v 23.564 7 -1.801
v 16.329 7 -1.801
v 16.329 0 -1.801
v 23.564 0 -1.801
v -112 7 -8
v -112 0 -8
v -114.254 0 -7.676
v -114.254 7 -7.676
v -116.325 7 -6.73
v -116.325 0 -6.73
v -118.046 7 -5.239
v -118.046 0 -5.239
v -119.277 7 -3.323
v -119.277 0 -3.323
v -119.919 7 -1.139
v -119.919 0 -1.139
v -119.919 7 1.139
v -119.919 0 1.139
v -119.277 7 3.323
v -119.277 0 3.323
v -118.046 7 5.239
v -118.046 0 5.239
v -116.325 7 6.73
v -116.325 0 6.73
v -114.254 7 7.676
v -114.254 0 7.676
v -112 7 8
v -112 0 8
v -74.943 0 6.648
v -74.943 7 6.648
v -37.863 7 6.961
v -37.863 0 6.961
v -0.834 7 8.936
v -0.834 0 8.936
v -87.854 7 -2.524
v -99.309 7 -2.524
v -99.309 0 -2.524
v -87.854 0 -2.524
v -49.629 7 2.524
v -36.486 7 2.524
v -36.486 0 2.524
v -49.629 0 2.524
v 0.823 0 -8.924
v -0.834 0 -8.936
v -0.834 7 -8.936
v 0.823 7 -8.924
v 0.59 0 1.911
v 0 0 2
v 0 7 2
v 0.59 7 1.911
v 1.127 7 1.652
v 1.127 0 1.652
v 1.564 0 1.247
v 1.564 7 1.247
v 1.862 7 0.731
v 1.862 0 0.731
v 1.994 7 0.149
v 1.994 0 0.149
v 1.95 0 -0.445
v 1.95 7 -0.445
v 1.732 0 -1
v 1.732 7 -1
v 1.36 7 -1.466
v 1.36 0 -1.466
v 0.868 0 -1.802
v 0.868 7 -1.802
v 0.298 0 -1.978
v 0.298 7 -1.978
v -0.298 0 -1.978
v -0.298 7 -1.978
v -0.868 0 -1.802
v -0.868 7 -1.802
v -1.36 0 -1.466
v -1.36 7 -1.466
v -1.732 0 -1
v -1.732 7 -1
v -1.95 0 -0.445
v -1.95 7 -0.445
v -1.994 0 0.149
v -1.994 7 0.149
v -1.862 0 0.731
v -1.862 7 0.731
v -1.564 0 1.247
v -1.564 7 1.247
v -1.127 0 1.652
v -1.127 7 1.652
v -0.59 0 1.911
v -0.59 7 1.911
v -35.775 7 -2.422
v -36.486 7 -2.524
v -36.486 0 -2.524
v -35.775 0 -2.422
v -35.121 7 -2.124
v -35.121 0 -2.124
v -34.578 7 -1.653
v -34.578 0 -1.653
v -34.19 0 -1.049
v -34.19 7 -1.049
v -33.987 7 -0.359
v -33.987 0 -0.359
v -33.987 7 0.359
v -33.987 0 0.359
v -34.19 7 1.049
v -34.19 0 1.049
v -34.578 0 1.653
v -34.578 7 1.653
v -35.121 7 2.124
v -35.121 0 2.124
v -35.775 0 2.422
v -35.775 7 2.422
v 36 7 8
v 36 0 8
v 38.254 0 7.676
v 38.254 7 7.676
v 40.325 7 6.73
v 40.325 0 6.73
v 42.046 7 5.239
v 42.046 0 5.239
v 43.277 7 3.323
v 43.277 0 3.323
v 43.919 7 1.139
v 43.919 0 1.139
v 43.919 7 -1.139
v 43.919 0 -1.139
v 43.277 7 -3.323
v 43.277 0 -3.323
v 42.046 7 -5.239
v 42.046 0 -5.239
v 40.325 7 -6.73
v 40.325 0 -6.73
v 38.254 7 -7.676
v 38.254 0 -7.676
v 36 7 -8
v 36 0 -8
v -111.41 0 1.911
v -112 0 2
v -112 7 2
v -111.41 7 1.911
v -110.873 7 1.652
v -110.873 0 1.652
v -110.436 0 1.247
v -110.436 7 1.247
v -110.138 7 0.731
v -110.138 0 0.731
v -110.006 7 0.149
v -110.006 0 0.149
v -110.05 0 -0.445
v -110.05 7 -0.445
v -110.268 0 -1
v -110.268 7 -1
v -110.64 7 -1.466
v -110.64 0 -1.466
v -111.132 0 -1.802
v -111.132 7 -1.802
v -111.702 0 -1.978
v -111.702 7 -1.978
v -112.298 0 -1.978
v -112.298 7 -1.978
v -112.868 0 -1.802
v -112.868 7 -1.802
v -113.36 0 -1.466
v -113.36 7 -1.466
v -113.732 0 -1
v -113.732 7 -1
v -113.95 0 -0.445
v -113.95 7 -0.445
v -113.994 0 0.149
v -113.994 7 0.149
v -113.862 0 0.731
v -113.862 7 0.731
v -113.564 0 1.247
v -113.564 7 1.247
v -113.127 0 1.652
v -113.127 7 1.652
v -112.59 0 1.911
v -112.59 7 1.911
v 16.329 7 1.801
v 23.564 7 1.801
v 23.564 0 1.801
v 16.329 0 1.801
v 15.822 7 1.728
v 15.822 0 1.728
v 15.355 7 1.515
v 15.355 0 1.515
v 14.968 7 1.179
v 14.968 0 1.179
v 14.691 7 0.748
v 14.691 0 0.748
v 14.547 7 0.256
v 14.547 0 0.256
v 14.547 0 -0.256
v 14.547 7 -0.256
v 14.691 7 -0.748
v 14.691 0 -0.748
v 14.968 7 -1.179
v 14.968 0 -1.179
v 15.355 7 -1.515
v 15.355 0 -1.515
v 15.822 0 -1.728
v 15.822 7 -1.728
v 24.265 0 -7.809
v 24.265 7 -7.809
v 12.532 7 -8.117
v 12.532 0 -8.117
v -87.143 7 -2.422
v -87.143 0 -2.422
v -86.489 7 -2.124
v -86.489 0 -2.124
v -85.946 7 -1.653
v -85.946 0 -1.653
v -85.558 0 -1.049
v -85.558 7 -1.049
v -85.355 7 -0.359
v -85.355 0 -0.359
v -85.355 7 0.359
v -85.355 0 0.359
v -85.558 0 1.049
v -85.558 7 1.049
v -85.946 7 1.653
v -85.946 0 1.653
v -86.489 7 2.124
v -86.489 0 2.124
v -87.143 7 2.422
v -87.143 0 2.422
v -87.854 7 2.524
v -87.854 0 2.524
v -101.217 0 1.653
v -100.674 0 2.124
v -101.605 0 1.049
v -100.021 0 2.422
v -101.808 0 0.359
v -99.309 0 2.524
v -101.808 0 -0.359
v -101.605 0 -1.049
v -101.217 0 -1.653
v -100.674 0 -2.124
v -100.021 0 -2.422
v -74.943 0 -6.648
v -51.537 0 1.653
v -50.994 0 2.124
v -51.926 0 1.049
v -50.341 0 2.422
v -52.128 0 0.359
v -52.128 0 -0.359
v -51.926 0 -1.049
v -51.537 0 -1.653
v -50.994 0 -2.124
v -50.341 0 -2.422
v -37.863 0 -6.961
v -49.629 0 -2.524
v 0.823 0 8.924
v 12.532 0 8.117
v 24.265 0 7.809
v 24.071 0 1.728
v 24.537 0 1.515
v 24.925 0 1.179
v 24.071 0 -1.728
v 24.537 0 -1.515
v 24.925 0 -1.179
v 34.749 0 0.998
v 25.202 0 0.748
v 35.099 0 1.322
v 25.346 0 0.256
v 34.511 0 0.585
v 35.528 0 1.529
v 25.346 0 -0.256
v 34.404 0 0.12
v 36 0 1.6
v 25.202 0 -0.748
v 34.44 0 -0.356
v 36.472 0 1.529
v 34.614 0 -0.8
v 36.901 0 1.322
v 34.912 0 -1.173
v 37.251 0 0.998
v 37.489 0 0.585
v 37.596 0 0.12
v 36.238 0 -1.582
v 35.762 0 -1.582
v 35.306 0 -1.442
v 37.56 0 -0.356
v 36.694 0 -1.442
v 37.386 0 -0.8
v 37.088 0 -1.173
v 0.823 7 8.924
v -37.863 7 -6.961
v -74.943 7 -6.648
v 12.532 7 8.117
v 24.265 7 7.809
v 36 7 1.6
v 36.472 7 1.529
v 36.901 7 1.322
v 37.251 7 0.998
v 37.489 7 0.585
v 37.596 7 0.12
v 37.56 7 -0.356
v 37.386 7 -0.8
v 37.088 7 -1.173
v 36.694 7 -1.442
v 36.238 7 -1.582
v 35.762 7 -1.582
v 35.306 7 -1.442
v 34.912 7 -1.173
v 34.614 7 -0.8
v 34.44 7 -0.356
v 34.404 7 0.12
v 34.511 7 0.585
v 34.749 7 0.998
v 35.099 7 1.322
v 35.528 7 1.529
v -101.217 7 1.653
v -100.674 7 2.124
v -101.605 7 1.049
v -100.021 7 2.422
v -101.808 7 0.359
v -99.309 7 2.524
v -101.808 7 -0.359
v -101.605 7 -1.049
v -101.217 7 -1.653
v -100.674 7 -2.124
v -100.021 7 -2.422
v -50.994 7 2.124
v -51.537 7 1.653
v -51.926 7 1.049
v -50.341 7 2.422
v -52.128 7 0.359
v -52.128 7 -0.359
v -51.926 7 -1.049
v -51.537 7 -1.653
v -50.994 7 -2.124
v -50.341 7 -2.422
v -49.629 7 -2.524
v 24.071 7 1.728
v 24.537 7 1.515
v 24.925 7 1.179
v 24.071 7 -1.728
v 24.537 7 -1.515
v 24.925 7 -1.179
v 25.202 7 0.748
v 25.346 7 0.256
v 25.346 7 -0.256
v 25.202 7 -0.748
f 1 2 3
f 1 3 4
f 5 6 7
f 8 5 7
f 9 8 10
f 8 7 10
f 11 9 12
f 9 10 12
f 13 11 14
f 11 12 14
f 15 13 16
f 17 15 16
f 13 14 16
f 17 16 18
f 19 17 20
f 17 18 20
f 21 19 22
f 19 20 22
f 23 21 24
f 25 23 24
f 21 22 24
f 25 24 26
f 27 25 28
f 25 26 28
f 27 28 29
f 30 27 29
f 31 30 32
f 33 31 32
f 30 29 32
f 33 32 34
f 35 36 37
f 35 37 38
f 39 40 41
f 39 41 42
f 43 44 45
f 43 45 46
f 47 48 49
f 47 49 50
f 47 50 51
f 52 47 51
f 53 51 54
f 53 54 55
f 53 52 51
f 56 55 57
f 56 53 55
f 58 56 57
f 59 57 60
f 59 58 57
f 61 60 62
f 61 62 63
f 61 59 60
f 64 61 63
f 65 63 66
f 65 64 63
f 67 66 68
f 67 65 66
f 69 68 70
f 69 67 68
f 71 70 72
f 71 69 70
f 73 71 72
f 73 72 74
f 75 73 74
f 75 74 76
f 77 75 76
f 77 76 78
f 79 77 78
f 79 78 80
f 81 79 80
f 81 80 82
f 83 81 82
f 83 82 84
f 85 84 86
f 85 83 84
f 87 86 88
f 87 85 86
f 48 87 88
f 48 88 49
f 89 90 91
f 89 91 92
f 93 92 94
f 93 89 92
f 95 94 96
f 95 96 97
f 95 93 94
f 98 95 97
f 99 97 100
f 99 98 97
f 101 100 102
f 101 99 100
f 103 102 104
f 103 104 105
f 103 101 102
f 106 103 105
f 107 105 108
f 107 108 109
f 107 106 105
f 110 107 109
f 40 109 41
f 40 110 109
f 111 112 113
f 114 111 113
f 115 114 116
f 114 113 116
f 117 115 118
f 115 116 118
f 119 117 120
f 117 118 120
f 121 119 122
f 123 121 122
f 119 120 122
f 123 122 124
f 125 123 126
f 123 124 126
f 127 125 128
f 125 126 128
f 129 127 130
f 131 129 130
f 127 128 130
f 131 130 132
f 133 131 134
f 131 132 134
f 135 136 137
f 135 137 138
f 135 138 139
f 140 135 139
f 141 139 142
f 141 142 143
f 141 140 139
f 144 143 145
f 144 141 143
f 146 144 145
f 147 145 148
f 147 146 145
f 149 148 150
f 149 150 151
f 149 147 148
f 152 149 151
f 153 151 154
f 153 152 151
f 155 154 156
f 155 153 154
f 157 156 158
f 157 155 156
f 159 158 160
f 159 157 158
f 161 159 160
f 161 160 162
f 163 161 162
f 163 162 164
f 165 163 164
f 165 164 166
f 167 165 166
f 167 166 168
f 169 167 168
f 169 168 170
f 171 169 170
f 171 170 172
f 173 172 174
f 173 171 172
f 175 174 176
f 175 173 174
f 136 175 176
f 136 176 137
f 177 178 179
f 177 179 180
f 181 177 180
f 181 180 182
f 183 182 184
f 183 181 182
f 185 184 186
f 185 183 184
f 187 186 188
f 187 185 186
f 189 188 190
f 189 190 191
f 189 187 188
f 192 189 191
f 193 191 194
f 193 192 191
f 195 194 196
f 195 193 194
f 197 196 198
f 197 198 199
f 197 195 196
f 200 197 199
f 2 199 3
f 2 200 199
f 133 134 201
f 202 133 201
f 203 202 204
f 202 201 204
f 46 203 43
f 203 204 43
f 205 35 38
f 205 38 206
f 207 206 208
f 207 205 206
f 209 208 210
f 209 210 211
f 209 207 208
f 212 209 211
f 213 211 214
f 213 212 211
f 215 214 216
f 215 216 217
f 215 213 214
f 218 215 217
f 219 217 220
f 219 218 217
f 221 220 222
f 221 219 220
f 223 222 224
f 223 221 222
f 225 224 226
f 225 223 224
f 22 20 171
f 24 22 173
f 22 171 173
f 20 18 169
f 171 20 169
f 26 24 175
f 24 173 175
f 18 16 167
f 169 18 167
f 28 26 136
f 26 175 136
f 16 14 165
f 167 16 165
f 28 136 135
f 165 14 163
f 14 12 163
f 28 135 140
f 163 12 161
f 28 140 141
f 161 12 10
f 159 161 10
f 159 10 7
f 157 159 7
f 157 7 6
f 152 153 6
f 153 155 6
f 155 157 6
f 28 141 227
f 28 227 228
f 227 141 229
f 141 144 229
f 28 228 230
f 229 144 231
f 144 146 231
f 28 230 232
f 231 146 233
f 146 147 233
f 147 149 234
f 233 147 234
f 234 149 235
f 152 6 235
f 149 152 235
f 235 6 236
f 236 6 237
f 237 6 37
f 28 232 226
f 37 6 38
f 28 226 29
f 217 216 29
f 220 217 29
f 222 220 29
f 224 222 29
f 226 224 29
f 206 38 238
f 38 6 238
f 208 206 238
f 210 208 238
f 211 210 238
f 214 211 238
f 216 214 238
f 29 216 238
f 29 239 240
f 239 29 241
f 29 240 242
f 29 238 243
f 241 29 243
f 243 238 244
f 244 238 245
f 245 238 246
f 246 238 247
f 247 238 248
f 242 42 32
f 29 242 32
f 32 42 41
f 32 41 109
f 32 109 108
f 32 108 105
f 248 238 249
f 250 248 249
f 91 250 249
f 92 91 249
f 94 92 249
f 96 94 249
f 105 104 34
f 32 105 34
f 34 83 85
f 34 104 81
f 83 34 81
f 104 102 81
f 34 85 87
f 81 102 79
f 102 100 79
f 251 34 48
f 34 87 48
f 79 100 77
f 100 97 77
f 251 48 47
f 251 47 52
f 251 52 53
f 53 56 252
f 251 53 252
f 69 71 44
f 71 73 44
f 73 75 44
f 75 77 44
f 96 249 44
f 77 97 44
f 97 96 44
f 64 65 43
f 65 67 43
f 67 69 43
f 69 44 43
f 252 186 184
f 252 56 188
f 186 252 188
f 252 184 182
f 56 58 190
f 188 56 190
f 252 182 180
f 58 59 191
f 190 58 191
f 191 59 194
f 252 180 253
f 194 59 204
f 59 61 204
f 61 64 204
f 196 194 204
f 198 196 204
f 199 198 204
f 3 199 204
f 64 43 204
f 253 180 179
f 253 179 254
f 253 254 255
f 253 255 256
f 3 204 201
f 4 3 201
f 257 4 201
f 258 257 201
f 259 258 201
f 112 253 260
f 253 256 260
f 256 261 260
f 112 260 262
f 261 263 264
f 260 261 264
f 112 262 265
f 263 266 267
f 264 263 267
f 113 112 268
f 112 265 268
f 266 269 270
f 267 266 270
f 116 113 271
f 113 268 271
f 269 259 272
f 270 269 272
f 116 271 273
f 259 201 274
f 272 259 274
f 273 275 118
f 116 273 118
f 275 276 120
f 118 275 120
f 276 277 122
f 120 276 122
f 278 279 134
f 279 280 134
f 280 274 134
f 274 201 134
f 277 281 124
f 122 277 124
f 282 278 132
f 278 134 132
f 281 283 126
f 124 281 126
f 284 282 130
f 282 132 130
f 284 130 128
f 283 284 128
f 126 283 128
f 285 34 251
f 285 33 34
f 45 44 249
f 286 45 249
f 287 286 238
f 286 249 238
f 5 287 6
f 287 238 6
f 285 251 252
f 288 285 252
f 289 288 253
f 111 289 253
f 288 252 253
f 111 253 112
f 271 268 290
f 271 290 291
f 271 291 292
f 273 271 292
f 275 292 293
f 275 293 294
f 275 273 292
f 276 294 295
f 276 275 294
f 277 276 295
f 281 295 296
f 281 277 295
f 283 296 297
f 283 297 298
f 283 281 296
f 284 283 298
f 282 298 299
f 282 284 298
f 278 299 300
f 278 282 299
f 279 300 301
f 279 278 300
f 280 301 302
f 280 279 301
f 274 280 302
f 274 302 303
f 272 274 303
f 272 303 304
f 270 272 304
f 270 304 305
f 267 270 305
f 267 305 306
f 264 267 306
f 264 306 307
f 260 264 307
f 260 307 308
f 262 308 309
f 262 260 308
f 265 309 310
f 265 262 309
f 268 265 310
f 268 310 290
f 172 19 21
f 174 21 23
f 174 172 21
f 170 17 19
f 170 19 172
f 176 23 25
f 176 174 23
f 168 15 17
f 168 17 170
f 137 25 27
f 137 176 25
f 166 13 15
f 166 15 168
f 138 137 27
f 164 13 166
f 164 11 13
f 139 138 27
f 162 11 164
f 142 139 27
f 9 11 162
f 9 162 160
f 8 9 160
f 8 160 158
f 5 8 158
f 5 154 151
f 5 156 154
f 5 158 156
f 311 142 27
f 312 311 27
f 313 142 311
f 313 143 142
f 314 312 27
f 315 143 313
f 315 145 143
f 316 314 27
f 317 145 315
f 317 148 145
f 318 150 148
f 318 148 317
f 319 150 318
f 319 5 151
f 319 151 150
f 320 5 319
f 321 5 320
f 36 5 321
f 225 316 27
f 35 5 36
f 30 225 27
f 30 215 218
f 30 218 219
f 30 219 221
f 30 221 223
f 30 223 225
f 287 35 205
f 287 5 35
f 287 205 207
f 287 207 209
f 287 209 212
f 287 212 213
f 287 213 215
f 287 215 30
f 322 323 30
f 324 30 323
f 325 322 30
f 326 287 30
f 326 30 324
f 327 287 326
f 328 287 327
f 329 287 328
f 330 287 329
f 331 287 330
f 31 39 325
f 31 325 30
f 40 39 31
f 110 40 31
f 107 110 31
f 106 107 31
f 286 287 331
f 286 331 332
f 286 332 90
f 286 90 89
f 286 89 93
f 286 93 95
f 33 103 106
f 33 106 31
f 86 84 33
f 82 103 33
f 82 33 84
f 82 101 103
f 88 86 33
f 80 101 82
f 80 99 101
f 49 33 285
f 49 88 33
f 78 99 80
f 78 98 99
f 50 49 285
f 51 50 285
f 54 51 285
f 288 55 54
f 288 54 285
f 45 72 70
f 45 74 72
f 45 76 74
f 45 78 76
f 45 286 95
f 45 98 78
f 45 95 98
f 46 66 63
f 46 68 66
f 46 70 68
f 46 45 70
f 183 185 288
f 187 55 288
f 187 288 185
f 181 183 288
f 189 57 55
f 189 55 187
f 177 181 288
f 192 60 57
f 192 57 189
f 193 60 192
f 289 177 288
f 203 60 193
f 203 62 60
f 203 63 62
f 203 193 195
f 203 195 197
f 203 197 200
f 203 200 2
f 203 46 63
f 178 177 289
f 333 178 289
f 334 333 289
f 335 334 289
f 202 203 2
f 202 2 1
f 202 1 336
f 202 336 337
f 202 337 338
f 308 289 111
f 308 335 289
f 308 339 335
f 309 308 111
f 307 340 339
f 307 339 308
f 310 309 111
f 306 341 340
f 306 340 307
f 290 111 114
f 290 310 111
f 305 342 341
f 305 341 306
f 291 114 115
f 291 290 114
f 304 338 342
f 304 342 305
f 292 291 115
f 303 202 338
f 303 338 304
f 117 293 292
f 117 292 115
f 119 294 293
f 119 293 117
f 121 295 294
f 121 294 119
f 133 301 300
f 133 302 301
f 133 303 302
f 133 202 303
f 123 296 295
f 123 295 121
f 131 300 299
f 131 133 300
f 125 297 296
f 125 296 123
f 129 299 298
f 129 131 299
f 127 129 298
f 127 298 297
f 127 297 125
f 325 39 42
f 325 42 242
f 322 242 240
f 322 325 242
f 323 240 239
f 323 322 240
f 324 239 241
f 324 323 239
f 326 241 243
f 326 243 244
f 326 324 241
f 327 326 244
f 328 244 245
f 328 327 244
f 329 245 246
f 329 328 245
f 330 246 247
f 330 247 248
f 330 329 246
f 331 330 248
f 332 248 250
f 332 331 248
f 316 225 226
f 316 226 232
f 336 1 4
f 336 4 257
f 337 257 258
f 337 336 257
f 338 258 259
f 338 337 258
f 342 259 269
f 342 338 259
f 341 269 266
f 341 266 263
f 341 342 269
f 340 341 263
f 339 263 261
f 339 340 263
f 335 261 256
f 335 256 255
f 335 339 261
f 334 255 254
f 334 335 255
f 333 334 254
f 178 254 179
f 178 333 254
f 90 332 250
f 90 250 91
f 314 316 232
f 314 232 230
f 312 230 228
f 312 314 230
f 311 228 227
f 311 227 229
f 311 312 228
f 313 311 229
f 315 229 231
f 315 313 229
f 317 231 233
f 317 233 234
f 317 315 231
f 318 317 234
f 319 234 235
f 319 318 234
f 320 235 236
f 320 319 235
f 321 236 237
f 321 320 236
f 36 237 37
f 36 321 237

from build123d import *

# Parameters (mm, degrees)
SKETCH1_R           = 2
SKETCH1_R_2         = 1.6
BOSS_EXTRUDE1_DEPTH = 7
FILLET1_R           = 10
CUT_EXTRUDE1_DEPTH  = 7


with BuildPart() as part:
    # Sketch1 → Boss-Extrude1 (new body)
    with BuildSketch(Plane(origin=(0, 0, 0), x_dir=(1, 0, 0), z_dir=(0, 1, 0))):
        with BuildLine():
            ThreePointArc((-112, -8), (-55.983036626, -6.600102157), (0, -9))
            ThreePointArc((0, -9), (17.983664082, -7.911906937), (36, -8))
            ThreePointArc((36, -8), (44, 0), (36, 8))
            ThreePointArc((36, 8), (17.983664082, 7.911906937), (0, 9))
            ThreePointArc((0, 9), (-55.983036626, 6.600102157), (-112, 8))
            ThreePointArc((-112, 8), (-120, 0), (-112, -8))
        make_face()
        with Locations(Location((-112, 0, 0), (0, 0, 270))):
            Circle(SKETCH1_R, mode=Mode.SUBTRACT)
        with Locations(Location((0, 0, 0), (0, 0, 270))):
            Circle(SKETCH1_R, mode=Mode.SUBTRACT)
        with Locations(Location((36, 0, 0), (0, 0, 270))):
            Circle(SKETCH1_R_2, mode=Mode.SUBTRACT)
    extrude(amount=BOSS_EXTRUDE1_DEPTH)

    # Fillet1
    fillet1_edges = [part.edges().sort_by_distance(p)[0] for p in [
        (0, 3.5, 9),
        (0, 3.5, -9),
    ]]
    fillet(fillet1_edges, radius=FILLET1_R)

    # Sketch2 → Cut-Extrude1 (cut)
    with BuildSketch(Plane(origin=(0, 7, 0), x_dir=(1, 0, 0), z_dir=(0, 1, 0))):
        with BuildLine():
            Line((-99.309344494, 2.524246591), (-87.854034524, 2.524246591))
            ThreePointArc((-87.854034524, 2.524246591), (-85.329787933, 0), (-87.854034524, -2.524246591))
            Line((-87.854034524, -2.524246591), (-99.309344494, -2.524246591))
            ThreePointArc((-99.309344494, -2.524246591), (-101.833591085, 0), (-99.309344494, 2.524246591))
        make_face()
        with BuildLine():
            Line((-49.629473884, 2.524246591), (-36.48601297, 2.524246591))
            ThreePointArc((-36.48601297, 2.524246591), (-33.96176638, 0), (-36.48601297, -2.524246591))
            Line((-36.48601297, -2.524246591), (-49.629473884, -2.524246591))
            ThreePointArc((-49.629473884, -2.524246591), (-52.153720475, 0), (-49.629473884, 2.524246591))
        make_face()
        with BuildLine():
            Line((16.328995105, 1.800753329), (23.563927718, 1.800753329))
            ThreePointArc((23.563927718, 1.800753329), (25.364681048, 0), (23.563927718, -1.800753329))
            Line((23.563927718, -1.800753329), (16.328995105, -1.800753329))
            ThreePointArc((16.328995105, -1.800753329), (14.528241776, 0), (16.328995105, 1.800753329))
        make_face()
    extrude(amount=-CUT_EXTRUDE1_DEPTH, mode=Mode.SUBTRACT)


solid = part.part
